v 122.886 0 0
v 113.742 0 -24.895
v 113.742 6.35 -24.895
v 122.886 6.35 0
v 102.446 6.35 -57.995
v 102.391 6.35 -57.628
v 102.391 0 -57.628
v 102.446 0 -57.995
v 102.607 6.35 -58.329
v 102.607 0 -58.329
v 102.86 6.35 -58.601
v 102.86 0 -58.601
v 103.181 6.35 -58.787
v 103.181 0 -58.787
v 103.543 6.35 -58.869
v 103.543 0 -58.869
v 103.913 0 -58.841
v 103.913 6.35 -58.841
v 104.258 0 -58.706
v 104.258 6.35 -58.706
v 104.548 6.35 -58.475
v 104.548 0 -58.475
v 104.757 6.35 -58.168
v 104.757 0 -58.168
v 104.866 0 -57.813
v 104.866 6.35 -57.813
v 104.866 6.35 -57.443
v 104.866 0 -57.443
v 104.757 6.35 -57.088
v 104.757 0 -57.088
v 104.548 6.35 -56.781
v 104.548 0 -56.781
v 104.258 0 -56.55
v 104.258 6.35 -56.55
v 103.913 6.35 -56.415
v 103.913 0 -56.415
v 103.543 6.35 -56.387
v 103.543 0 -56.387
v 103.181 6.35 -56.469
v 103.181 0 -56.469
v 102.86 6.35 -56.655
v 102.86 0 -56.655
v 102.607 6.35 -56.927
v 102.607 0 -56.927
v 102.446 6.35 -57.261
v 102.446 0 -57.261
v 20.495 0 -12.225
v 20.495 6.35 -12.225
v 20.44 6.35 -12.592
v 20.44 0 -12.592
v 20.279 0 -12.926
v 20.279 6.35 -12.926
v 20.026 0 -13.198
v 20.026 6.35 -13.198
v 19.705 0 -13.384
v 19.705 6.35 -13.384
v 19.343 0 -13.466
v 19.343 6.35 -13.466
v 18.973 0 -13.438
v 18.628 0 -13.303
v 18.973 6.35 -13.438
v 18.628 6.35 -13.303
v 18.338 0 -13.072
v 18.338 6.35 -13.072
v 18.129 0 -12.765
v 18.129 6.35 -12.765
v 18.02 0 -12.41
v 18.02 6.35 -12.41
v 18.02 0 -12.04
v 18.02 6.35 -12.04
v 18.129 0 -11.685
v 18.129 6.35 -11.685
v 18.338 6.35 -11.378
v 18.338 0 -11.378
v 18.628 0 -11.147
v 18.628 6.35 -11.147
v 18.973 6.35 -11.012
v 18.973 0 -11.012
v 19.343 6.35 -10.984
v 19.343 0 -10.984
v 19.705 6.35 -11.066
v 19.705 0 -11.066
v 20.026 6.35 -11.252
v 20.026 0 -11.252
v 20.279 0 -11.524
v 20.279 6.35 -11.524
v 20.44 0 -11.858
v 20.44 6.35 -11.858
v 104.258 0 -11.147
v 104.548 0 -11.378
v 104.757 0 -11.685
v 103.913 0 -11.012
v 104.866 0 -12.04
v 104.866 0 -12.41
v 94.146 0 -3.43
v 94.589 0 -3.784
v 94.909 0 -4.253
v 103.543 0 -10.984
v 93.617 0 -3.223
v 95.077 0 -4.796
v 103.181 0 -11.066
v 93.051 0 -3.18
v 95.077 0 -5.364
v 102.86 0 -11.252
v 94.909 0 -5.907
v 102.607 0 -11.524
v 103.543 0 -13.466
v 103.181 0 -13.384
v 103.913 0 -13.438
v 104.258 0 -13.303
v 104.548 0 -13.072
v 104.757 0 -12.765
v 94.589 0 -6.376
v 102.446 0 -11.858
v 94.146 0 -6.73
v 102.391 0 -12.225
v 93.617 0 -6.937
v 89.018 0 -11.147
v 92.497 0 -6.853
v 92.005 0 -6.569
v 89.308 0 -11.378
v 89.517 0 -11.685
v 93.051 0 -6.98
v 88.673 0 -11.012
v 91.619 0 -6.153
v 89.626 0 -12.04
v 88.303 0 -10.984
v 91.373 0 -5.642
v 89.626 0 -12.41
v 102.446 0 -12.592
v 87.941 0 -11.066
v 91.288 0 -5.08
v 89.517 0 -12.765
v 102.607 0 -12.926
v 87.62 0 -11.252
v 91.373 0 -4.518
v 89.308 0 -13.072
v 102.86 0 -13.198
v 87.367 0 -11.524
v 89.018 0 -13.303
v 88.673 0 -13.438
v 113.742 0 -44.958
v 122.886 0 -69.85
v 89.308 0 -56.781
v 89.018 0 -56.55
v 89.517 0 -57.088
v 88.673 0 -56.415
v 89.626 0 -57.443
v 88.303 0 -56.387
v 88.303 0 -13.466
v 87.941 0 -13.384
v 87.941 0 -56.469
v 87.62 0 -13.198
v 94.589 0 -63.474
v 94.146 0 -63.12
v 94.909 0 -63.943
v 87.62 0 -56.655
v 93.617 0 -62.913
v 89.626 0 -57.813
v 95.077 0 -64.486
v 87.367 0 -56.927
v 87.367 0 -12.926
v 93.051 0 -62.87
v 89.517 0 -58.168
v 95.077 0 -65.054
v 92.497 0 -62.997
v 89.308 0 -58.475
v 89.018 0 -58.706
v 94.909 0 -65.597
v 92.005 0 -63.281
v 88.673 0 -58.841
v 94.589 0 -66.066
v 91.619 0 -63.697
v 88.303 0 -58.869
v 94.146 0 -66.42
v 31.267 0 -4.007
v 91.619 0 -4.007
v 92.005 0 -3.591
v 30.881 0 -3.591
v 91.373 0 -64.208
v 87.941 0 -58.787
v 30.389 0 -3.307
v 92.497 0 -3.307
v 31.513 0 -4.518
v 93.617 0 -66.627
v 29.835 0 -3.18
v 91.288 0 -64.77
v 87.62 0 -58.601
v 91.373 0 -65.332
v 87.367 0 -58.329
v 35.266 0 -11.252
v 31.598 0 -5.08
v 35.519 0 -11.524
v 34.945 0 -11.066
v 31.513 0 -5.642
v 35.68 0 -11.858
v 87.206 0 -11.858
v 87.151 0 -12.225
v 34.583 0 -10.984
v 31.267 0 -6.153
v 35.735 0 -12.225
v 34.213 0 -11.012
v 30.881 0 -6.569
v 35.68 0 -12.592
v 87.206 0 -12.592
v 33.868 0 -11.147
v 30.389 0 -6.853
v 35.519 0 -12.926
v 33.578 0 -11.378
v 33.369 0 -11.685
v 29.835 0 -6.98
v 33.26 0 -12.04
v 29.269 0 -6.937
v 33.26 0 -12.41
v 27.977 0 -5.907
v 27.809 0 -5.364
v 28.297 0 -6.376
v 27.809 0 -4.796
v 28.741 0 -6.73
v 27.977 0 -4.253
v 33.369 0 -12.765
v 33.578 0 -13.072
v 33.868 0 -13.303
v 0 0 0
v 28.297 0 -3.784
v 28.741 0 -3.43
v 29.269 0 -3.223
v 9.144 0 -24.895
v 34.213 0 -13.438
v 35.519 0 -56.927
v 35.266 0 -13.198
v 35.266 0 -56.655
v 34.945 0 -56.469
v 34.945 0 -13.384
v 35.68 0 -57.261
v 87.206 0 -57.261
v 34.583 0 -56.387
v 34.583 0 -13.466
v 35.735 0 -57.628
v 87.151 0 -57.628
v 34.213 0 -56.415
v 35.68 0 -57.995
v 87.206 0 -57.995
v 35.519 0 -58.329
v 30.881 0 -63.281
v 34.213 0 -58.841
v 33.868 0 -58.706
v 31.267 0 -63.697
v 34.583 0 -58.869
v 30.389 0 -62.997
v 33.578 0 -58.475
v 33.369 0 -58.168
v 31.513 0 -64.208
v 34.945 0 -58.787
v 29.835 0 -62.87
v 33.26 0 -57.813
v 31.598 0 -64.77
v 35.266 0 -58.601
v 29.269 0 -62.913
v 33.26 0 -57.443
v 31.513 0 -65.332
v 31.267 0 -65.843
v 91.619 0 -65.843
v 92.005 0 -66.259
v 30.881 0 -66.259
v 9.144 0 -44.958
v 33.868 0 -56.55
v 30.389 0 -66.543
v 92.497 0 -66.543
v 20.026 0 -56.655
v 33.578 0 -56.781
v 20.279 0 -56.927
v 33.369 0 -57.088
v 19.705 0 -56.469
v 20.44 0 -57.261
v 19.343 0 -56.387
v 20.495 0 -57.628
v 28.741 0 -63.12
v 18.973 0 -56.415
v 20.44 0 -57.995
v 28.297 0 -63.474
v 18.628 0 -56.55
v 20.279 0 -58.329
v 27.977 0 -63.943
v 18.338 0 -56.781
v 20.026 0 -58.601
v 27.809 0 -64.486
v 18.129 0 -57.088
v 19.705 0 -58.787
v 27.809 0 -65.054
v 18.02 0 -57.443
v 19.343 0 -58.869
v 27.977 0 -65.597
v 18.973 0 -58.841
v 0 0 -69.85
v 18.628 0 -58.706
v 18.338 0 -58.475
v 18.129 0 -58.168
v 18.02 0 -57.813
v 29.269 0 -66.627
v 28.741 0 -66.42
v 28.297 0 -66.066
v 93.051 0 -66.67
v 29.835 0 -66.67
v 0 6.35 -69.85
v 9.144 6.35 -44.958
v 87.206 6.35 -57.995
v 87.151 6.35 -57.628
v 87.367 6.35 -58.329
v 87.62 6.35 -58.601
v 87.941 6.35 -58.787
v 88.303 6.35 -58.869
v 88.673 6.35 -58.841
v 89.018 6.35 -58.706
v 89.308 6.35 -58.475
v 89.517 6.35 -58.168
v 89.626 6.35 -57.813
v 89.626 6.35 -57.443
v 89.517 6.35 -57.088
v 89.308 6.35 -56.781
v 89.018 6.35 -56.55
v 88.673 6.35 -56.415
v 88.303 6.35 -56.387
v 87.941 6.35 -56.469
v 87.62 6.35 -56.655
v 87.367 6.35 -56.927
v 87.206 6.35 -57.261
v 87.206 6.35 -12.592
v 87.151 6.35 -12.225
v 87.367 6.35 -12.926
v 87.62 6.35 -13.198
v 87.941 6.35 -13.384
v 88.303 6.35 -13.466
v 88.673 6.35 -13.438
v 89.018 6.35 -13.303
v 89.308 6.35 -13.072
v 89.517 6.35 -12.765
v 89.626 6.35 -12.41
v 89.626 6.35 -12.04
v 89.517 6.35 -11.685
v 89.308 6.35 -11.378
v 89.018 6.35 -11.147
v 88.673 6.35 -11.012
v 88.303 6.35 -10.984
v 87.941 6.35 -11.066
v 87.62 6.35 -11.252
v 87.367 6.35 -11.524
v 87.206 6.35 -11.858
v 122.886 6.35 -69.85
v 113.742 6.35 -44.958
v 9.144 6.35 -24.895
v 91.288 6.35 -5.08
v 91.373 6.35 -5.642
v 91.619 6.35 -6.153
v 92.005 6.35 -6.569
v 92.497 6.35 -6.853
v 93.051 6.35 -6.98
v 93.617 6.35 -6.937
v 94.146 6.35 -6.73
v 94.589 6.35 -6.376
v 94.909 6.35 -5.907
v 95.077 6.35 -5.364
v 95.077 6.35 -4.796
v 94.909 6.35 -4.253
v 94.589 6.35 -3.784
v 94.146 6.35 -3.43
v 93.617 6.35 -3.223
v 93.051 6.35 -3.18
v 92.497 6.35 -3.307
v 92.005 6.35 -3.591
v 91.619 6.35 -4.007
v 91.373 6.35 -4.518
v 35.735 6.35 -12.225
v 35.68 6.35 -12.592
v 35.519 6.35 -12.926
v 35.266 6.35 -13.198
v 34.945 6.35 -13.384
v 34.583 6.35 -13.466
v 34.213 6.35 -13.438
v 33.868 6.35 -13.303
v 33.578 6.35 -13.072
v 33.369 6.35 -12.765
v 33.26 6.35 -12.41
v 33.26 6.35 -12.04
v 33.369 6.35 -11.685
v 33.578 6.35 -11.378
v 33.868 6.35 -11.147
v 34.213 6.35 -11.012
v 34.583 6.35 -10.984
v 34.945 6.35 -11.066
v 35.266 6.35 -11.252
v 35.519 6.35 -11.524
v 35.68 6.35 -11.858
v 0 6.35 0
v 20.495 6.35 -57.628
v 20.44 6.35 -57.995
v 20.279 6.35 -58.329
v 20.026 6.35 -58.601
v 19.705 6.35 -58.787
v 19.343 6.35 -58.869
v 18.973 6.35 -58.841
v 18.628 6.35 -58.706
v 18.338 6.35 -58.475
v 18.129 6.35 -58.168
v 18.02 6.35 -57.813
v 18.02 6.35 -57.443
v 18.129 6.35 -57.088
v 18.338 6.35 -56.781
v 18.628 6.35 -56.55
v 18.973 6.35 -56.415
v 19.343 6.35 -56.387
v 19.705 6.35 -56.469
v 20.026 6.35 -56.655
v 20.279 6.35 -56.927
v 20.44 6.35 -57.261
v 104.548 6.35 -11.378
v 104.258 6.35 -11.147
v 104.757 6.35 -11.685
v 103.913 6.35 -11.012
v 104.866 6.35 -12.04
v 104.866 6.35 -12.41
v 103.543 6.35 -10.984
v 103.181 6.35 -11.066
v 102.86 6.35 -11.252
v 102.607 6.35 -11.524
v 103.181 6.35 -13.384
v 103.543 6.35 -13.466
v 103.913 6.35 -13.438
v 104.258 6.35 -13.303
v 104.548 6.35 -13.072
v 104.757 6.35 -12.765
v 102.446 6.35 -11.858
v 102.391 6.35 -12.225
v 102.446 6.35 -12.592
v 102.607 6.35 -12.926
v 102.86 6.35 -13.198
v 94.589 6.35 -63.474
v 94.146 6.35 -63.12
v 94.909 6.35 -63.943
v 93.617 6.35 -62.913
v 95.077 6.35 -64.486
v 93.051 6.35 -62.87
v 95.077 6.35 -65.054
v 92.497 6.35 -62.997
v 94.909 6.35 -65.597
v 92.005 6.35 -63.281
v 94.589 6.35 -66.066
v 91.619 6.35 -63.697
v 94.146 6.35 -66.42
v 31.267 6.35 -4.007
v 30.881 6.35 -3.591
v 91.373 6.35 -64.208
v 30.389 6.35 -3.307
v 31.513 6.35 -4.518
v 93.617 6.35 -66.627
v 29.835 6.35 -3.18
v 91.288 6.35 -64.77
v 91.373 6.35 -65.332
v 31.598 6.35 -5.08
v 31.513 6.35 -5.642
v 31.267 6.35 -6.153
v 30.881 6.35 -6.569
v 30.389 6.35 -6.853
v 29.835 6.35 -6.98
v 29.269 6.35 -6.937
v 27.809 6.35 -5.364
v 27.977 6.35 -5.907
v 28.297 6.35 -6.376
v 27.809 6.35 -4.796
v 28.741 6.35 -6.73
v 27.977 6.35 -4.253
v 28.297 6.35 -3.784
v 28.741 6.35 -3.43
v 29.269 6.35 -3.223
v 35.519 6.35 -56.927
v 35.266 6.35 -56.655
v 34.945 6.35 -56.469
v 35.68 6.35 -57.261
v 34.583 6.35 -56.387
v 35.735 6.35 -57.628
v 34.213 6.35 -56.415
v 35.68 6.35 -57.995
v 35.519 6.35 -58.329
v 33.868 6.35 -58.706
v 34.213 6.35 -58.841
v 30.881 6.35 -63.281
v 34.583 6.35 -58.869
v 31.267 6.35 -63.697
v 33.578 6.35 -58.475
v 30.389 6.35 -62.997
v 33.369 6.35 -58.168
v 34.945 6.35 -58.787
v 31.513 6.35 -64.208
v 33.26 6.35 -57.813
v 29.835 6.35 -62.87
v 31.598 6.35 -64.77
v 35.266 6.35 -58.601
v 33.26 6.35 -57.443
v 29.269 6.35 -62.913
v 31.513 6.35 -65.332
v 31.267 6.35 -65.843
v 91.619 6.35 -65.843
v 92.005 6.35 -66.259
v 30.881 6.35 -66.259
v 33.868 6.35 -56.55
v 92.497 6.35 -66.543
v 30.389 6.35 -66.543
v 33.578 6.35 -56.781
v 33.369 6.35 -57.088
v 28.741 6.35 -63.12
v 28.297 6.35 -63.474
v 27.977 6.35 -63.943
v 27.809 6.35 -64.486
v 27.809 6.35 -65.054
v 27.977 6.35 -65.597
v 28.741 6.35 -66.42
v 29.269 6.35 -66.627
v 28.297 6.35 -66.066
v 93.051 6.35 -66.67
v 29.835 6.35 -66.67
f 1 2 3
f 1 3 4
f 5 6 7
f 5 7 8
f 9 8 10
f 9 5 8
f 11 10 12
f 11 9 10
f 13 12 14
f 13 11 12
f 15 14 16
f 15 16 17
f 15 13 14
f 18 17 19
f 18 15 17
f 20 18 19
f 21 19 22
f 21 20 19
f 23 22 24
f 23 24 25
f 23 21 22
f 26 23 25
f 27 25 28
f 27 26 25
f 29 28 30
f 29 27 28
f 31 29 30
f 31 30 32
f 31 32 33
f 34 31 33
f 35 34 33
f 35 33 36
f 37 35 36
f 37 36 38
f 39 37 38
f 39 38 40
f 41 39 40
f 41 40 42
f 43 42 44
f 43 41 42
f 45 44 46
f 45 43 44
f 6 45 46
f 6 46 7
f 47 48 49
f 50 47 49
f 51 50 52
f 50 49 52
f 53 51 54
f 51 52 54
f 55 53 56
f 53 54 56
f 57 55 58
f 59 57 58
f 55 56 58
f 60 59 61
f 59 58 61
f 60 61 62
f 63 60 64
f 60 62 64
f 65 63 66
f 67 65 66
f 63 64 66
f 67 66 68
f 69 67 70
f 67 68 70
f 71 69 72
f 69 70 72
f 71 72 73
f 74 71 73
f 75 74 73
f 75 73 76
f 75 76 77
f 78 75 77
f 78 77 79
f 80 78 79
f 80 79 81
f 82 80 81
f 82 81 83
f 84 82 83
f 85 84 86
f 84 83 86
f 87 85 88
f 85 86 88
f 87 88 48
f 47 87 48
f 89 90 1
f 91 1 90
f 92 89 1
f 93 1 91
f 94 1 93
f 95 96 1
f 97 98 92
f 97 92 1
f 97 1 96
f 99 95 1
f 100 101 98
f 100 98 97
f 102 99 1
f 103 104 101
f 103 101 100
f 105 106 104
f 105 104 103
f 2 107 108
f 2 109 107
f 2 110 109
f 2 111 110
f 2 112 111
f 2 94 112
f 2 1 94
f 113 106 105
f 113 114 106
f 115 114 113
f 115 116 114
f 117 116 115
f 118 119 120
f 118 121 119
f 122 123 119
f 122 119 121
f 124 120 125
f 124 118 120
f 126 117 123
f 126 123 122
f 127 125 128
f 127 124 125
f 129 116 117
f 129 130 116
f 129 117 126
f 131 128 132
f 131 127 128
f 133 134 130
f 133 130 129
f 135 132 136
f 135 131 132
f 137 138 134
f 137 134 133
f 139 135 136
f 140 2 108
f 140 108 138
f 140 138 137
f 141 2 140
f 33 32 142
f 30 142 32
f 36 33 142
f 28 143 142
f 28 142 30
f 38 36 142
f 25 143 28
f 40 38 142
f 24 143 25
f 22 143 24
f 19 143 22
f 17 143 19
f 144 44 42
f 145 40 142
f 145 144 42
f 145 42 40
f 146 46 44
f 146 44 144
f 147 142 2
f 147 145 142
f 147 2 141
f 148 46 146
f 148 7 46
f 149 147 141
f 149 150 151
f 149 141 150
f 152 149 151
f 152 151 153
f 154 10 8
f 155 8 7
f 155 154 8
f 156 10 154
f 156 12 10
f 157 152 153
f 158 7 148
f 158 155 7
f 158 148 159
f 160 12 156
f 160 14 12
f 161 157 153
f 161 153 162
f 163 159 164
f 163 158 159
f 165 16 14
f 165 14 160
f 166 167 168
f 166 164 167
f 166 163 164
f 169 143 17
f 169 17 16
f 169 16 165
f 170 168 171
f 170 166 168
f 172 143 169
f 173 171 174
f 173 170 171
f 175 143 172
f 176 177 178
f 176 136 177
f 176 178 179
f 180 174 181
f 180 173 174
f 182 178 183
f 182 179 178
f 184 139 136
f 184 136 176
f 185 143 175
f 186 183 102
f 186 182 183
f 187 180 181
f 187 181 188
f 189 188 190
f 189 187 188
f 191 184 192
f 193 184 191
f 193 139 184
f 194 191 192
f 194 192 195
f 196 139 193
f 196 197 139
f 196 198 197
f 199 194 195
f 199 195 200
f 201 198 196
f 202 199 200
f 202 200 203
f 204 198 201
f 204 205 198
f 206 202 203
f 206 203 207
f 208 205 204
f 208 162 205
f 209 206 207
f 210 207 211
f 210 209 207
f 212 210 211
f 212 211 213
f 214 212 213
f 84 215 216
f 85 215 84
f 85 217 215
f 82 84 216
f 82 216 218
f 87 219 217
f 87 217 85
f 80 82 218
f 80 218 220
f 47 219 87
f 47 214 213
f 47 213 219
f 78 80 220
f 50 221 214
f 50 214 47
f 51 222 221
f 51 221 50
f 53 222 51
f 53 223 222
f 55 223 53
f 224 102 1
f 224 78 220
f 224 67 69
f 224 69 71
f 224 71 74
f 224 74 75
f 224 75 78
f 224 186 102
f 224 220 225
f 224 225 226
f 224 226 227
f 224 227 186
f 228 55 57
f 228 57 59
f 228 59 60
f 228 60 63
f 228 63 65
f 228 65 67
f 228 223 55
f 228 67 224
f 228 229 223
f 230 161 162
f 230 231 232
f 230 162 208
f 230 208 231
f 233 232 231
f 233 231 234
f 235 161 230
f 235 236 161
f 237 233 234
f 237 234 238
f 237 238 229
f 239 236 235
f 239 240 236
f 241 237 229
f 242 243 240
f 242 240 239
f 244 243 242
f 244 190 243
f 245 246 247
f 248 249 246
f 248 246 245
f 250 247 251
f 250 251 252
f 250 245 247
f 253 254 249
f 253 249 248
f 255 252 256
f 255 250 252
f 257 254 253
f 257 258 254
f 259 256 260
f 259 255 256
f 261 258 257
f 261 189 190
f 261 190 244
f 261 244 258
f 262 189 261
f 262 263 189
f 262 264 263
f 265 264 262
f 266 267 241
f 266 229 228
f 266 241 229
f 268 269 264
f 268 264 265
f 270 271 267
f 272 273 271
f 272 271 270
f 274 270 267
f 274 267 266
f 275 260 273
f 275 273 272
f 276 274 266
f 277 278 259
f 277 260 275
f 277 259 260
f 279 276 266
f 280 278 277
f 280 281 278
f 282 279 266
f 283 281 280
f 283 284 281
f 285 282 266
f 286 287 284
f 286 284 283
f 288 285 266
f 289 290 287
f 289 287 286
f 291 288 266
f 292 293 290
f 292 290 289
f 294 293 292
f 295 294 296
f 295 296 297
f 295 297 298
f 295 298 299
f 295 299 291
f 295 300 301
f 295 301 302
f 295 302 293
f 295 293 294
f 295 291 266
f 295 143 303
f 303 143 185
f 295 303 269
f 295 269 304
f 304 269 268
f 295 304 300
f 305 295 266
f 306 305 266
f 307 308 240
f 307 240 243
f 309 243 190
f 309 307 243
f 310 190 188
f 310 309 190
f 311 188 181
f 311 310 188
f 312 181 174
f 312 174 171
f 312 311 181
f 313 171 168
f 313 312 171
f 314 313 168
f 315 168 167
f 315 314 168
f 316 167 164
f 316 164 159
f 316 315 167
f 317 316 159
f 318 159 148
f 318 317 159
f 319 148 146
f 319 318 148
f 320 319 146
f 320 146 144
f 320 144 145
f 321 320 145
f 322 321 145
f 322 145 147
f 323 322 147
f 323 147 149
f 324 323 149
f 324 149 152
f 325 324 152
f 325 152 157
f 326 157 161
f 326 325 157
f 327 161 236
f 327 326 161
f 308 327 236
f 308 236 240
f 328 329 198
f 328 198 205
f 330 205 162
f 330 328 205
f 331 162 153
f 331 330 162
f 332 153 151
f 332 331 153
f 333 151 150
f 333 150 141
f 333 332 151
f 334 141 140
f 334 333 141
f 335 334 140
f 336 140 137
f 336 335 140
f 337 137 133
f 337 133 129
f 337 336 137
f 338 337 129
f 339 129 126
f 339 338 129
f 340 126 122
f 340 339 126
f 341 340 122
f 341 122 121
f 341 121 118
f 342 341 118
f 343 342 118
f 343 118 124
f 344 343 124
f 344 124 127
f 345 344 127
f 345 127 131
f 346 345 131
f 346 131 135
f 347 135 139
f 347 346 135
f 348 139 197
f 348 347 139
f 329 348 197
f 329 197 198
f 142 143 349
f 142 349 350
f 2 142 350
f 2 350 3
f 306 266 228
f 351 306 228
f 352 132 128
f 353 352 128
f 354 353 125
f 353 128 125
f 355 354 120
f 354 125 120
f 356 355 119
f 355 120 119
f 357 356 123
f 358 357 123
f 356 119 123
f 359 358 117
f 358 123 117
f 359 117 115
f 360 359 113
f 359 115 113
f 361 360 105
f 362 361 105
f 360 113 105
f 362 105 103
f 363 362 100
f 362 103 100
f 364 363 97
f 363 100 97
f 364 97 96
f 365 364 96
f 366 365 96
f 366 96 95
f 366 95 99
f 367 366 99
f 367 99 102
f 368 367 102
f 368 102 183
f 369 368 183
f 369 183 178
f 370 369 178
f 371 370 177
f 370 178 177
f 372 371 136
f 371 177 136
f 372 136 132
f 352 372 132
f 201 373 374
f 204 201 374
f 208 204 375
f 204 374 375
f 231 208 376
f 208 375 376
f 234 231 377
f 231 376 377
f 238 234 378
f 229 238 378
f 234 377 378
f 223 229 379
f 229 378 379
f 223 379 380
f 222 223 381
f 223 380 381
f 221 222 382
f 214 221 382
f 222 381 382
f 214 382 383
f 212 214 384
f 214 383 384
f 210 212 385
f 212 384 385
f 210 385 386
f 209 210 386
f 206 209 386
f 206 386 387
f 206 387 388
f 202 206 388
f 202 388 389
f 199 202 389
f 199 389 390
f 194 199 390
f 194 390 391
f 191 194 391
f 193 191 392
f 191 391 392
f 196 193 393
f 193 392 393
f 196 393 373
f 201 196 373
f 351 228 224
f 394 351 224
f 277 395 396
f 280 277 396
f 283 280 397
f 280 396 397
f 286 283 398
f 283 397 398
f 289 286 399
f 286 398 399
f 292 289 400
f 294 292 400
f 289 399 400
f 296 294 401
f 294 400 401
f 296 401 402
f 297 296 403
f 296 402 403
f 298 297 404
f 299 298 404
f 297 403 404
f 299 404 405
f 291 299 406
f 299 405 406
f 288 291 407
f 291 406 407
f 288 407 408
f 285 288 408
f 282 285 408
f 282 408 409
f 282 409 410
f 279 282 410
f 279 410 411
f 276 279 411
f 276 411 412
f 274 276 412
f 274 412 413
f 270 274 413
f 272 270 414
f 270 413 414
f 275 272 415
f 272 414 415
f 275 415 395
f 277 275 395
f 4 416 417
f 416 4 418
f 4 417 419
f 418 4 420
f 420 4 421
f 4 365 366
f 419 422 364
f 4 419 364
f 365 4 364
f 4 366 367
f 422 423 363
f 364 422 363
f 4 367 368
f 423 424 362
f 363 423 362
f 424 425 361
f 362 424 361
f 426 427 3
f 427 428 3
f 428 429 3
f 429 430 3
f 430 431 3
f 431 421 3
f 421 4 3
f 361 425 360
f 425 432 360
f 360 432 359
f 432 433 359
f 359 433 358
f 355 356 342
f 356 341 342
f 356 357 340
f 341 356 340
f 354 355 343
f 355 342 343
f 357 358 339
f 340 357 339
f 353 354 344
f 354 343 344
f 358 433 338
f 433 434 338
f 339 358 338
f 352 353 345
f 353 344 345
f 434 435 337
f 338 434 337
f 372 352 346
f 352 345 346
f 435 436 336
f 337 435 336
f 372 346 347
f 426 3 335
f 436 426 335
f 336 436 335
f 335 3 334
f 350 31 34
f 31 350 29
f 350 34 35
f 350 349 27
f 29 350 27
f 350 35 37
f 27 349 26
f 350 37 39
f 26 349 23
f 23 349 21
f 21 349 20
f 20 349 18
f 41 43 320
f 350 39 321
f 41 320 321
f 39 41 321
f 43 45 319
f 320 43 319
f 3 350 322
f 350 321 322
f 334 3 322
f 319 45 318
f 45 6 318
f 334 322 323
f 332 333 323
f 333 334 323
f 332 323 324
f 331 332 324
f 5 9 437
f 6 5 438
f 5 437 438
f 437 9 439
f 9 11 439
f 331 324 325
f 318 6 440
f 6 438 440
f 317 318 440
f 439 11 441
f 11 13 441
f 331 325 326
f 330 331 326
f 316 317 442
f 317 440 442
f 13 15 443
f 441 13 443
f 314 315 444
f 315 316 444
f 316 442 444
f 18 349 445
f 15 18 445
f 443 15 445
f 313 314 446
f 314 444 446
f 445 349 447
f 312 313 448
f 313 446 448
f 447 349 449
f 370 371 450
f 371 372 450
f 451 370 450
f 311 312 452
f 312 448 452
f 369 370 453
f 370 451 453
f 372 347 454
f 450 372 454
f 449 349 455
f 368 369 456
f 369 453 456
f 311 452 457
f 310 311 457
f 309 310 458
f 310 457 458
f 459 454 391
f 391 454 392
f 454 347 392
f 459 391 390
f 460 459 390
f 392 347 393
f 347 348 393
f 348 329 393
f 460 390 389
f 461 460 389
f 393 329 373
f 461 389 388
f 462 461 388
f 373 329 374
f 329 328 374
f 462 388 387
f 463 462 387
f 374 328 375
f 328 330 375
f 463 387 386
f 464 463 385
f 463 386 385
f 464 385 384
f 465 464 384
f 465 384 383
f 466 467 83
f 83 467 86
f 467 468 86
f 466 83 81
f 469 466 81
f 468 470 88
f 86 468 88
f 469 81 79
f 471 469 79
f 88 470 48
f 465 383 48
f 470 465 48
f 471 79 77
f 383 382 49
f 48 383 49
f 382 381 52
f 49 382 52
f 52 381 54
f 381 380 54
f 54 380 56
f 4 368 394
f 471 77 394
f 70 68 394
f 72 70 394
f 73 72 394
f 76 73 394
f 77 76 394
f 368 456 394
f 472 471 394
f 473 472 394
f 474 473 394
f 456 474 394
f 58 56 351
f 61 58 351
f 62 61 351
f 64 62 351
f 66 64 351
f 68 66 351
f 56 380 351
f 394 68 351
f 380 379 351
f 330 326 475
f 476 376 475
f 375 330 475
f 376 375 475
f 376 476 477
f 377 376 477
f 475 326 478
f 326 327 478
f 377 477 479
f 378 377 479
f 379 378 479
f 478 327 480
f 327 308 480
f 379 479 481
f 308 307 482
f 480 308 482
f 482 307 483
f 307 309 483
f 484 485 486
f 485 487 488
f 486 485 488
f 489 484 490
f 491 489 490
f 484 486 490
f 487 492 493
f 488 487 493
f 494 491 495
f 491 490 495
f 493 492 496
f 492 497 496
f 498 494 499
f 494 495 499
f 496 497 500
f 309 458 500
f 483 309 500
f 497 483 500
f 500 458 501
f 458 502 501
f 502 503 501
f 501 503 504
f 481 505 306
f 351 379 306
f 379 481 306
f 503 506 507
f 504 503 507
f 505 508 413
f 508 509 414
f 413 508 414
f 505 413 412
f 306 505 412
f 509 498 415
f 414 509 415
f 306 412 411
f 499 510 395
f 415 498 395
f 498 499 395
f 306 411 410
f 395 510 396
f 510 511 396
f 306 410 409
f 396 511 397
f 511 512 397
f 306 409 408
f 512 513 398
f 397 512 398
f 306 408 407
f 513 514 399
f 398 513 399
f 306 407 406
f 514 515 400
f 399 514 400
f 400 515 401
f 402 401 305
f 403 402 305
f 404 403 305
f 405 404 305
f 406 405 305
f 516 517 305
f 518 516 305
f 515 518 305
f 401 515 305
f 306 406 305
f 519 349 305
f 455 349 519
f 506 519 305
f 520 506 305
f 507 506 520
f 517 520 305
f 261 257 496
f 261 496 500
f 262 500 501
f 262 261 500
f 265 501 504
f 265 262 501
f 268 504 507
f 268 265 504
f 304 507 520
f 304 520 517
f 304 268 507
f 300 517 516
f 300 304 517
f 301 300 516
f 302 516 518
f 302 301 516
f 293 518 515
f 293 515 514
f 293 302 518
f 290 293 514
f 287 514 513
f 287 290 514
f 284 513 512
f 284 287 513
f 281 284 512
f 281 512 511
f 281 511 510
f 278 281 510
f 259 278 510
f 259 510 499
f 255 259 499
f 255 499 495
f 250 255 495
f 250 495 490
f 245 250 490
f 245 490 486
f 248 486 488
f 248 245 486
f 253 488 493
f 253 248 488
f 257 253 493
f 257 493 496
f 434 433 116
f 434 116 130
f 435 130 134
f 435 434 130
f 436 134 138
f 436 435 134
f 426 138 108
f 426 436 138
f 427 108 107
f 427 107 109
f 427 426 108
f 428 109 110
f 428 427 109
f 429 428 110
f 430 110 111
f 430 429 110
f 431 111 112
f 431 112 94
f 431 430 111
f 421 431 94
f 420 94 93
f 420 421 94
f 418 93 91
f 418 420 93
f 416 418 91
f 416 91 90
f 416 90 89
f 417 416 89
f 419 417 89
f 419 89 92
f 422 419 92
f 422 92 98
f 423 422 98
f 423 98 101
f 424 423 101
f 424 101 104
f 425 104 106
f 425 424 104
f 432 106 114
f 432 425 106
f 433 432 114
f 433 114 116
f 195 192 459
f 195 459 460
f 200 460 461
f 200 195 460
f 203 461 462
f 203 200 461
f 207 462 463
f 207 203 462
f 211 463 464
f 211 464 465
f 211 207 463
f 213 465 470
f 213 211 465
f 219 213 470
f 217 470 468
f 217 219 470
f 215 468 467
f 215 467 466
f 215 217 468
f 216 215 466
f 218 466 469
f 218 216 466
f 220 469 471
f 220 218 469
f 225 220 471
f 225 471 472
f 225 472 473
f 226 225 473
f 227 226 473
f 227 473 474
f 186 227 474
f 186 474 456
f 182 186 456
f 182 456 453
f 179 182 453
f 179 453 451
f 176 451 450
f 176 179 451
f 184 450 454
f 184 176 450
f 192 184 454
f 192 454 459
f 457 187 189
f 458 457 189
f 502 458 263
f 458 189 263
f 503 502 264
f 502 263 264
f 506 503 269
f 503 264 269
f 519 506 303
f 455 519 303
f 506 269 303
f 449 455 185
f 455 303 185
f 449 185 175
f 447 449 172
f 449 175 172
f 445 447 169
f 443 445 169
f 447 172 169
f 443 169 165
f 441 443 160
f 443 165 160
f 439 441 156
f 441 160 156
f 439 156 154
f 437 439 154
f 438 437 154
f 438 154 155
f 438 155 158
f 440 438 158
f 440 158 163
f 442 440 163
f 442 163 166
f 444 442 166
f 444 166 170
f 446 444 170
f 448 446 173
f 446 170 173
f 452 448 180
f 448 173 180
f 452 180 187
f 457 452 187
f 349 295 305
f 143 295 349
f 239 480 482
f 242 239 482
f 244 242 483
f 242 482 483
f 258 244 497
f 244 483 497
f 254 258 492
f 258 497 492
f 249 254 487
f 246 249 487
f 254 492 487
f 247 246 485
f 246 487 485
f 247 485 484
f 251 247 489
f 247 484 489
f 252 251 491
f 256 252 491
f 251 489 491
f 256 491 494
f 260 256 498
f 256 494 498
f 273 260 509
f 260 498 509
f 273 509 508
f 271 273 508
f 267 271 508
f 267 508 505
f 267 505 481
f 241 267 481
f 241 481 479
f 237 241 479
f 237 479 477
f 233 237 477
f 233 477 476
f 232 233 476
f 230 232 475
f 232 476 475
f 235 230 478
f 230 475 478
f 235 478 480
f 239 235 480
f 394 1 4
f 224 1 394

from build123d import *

# Parameters (mm, degrees)
SKETCH10_R          = 1.905
BOSS_EXTRUDE2_DEPTH = 6.35
SKETCH11_R          = 1.2446
CUT_EXTRUDE1_DEPTH  = 6.35


with BuildPart() as part:
    # Sketch10 → Boss-Extrude2 (new body)
    with BuildSketch(Plane(origin=(0, 0, 0), x_dir=(1, 0, 0), z_dir=(0, 1, 0))):
        Polygon((0, 69.85), (9.144, 44.958), (9.144, 24.894999994), (0, 0), (61.443008686, 0), (61.443008686, 69.85), align=None)
        with Locations((29.693008686, 64.77)):
            Circle(SKETCH10_R, mode=Mode.SUBTRACT)
        with Locations((29.693008686, 5.08)):
            Circle(SKETCH10_R, mode=Mode.SUBTRACT)
    boss_extrude2 = extrude(amount=BOSS_EXTRUDE2_DEPTH)

    # Sketch11 → Cut-Extrude1 (cut)
    with BuildSketch(Plane(origin=(0, 6.35, 0), x_dir=(1, 0, 0), z_dir=(0, 1, 0))):
        with Locations((34.490278238, 57.62800006)):
            Circle(SKETCH11_R)
        with Locations((19.250278238, 57.62800006)):
            Circle(SKETCH11_R)
        with Locations((34.490278238, 12.224999934)):
            Circle(SKETCH11_R)
        with Locations((19.250278238, 12.224999934)):
            Circle(SKETCH11_R)
    cut_extrude1 = extrude(amount=-CUT_EXTRUDE1_DEPTH, mode=Mode.SUBTRACT)

    # Mirror3: Boss-Extrude2, Cut-Extrude1 across plane
    add(boss_extrude2.mirror(Plane(origin=(61.443008686, 6.35, 0), x_dir=(0, 0, 1), z_dir=(-1, 0, 0))))
    add(cut_extrude1.mirror(Plane(origin=(61.443008686, 6.35, 0), x_dir=(0, 0, 1), z_dir=(-1, 0, 0))), mode=Mode.SUBTRACT)


solid = part.part
